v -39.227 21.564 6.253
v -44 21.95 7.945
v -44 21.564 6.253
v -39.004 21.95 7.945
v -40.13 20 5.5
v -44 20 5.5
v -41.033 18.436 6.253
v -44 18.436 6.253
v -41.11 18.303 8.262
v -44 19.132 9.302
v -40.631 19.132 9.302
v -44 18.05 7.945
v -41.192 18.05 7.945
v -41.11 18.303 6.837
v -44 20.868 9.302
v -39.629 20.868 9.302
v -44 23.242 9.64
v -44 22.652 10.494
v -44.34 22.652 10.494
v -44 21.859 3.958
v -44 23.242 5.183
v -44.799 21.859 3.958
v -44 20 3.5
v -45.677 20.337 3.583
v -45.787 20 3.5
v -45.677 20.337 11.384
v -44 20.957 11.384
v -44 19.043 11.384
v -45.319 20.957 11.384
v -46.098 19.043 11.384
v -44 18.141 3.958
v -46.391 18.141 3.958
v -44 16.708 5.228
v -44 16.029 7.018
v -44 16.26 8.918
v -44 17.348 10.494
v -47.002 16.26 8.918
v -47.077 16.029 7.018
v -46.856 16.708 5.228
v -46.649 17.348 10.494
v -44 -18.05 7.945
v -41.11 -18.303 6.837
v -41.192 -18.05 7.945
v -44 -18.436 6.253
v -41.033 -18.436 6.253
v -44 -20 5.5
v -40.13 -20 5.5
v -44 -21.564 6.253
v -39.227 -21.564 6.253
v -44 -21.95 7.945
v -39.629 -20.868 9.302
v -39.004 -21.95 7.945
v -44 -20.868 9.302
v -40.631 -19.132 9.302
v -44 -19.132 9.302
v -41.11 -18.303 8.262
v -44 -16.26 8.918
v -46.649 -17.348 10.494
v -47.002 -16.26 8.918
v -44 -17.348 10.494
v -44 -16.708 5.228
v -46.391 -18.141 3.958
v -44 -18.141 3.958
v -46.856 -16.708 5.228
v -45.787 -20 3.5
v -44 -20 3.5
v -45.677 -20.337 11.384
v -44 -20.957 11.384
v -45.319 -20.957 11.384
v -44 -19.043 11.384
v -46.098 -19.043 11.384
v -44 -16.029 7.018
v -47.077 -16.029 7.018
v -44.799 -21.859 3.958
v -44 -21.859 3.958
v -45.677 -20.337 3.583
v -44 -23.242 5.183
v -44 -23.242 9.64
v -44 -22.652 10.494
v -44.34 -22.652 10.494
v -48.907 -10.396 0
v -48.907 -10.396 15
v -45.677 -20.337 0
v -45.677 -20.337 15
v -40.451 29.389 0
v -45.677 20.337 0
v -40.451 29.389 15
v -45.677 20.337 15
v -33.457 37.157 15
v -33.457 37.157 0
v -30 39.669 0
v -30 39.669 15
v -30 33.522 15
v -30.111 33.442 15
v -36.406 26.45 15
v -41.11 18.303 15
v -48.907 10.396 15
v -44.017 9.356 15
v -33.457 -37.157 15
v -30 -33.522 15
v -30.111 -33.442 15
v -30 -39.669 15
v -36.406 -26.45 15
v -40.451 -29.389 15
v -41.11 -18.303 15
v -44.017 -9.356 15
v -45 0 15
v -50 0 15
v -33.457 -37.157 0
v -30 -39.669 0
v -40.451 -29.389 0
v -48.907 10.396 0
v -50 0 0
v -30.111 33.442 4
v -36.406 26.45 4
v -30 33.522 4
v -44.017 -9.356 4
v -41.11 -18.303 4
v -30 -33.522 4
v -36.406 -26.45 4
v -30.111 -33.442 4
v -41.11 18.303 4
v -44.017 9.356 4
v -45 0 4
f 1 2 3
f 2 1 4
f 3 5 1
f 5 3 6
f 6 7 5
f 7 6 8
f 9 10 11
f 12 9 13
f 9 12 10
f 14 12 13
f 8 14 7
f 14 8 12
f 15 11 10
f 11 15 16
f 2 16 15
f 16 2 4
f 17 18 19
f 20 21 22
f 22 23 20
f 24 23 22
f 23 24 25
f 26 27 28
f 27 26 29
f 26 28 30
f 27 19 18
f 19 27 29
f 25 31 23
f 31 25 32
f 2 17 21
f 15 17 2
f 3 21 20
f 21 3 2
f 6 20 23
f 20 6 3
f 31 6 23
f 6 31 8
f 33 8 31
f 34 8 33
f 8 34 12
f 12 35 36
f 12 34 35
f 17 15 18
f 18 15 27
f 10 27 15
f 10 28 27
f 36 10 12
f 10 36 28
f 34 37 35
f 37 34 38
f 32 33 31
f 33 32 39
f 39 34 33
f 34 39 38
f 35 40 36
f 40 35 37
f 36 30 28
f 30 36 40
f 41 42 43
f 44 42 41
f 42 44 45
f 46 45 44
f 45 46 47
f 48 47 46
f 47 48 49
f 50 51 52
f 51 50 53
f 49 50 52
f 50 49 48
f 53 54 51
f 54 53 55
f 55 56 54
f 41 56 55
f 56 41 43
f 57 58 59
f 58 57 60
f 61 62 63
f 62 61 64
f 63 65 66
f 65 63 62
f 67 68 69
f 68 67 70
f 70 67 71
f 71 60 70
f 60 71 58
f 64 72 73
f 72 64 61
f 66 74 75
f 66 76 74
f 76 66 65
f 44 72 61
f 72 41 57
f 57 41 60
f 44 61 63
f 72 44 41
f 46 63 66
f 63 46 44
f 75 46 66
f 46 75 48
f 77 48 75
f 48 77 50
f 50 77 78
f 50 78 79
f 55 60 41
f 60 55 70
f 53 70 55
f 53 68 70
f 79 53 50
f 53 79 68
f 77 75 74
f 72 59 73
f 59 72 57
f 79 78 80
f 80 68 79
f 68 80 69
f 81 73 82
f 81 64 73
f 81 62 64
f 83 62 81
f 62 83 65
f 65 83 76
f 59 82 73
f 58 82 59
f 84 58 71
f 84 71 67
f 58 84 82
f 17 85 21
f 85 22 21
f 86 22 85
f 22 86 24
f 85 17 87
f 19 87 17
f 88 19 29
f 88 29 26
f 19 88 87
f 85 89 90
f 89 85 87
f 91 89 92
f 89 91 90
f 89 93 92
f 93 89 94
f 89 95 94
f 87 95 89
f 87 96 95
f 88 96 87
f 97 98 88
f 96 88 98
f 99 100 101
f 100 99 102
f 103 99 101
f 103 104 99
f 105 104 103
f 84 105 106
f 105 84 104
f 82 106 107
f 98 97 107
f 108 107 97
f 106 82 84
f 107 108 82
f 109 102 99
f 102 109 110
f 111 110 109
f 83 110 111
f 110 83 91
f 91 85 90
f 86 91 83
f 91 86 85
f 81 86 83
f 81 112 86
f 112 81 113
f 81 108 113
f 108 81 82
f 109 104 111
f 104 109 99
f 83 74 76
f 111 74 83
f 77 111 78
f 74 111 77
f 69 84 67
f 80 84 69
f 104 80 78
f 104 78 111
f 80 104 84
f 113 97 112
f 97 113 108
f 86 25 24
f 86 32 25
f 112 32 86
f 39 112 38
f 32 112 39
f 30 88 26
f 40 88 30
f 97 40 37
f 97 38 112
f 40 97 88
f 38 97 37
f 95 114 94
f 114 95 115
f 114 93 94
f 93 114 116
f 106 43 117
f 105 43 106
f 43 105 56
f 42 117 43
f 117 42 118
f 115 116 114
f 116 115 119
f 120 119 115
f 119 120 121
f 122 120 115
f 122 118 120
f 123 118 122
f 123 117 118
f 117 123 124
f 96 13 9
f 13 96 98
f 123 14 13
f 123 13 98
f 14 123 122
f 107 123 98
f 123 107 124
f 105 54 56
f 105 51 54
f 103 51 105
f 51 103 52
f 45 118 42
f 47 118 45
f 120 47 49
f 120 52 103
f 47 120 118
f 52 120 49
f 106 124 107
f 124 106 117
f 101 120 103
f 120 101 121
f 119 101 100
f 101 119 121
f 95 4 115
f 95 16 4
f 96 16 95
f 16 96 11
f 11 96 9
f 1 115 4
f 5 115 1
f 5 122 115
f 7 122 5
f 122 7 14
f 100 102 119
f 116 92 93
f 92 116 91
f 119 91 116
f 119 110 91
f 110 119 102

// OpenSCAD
a();
module a(){
	difference(){
	cylinder(r=50,h=15);
	translate([0,0,4]) cylinder(r=45,h=15);
	translate([-30,-80,-1]) cube([160,160,160]);
	translate([-70,20,15/2]) rotate([0,90,0]) { #cylinder(r=4/2,h=100); translate([0,00,-74]) #cylinder(r=4,h=100) ; }
	translate([-70,-20,15/2]) rotate([0,90,0]) { #cylinder(r=4/2,h=100); translate([0,00,-74]) #cylinder(r=4,h=100) ; }
	}
}
